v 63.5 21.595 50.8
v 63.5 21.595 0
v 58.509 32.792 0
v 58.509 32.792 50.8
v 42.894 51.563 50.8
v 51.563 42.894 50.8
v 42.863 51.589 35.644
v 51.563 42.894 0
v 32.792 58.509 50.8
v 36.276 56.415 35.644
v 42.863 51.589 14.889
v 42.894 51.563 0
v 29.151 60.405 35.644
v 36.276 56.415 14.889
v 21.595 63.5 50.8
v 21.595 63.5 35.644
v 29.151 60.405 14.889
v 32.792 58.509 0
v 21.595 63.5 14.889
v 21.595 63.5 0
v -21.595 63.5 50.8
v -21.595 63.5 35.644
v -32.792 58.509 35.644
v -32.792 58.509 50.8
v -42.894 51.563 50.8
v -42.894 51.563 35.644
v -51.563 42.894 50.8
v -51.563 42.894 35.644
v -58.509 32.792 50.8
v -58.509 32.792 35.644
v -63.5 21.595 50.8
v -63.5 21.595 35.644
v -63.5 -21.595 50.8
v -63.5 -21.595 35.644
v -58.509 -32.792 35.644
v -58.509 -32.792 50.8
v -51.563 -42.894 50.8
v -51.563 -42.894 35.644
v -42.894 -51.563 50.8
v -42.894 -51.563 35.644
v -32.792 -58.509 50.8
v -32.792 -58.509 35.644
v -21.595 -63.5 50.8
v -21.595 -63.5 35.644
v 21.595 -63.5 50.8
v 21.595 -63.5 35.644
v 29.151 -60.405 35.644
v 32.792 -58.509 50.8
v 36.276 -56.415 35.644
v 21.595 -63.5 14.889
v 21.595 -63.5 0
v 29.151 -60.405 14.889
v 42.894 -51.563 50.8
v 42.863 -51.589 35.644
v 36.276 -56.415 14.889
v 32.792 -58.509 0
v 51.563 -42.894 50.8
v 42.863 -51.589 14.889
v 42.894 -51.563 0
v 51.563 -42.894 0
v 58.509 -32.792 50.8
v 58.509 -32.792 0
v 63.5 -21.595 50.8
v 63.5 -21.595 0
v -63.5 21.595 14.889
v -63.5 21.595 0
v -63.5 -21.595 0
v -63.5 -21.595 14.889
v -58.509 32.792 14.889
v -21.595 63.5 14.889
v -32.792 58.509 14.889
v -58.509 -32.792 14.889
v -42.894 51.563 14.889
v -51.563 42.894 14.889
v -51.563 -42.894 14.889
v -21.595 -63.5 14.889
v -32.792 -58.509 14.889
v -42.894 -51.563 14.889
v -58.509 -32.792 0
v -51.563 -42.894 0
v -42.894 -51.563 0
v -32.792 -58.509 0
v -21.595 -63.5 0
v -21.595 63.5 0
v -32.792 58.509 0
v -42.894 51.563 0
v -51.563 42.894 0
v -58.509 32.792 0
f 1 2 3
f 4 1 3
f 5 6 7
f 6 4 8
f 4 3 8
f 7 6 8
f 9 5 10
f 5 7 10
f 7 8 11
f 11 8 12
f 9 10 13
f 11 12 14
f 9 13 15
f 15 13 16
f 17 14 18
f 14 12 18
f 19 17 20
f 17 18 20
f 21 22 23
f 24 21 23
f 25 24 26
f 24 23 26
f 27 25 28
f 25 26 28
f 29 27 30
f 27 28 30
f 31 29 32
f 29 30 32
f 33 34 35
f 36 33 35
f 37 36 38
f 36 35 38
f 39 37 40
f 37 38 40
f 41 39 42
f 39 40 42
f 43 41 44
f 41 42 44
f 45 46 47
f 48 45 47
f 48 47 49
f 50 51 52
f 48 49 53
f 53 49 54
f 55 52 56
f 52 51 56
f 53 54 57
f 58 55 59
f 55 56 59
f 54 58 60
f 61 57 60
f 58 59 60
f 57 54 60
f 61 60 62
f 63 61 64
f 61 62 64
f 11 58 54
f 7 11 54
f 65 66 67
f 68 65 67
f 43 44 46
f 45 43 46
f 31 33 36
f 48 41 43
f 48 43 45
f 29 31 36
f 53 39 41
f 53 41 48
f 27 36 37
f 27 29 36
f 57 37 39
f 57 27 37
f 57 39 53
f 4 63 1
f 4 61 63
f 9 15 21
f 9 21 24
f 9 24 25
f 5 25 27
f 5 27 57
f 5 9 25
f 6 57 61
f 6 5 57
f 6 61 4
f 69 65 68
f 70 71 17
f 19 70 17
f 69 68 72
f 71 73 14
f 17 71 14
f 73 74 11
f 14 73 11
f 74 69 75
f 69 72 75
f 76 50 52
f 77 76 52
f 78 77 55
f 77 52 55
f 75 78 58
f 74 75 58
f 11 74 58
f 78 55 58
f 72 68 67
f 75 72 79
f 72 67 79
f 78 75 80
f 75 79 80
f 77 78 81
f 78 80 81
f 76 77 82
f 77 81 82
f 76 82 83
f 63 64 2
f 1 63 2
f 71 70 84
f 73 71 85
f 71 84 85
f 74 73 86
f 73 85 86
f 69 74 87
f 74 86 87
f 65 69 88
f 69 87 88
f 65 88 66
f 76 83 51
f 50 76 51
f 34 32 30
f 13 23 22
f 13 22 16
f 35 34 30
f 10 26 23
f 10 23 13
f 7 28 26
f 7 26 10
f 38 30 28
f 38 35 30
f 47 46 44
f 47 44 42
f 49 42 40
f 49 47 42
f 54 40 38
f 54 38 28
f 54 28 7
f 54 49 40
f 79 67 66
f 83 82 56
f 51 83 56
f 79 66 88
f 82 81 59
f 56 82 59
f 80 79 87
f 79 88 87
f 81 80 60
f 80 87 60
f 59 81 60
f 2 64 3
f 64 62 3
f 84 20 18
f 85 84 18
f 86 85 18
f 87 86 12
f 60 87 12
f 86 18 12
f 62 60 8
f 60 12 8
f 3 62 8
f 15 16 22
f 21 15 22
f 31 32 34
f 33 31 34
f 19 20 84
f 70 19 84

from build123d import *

# Parameters (mm, degrees)
F1_DEPTH = 50.8
F2_W     = 106.4794771373
F2_H     = 20.7544723526
F3_DEPTH = 85.852


with BuildPart() as f1:
    # F0 (on Top) → F1 (new body)
    with BuildSketch(Plane.XY):
        with BuildLine():
            Line((63.5, -21.5948767427), (63.5, 21.5948767427))
            ThreePointArc((63.5, 21.5948767427), (47.4267261232, 47.4267261232), (21.5948767427, 63.5))
            Line((21.5948767427, 63.5), (-21.5948767427, 63.5))
            ThreePointArc((-21.5948767427, 63.5), (-47.4267261232, 47.4267261232), (-63.5, 21.5948767427))
            Line((-63.5, 21.5948767427), (-63.5, -21.5948767427))
            ThreePointArc((-63.5, -21.5948767427), (-47.4267261232, -47.4267261232), (-21.5948767427, -63.5))
            Line((-21.5948767427, -63.5), (21.5948767427, -63.5))
            ThreePointArc((21.5948767427, -63.5), (47.4267261232, -47.4267261232), (63.5, -21.5948767427))
        make_face()
    extrude(amount=F1_DEPTH)

    # F2 (on Front) → F3 (cut, symmetric)
    with BuildSketch(Plane.XZ):
        with Locations((-10.3772375733, 25.2663153224)):
            Rectangle(F2_W, F2_H)
    extrude(amount=F3_DEPTH, both=True, mode=Mode.SUBTRACT)


solid = f1.part
